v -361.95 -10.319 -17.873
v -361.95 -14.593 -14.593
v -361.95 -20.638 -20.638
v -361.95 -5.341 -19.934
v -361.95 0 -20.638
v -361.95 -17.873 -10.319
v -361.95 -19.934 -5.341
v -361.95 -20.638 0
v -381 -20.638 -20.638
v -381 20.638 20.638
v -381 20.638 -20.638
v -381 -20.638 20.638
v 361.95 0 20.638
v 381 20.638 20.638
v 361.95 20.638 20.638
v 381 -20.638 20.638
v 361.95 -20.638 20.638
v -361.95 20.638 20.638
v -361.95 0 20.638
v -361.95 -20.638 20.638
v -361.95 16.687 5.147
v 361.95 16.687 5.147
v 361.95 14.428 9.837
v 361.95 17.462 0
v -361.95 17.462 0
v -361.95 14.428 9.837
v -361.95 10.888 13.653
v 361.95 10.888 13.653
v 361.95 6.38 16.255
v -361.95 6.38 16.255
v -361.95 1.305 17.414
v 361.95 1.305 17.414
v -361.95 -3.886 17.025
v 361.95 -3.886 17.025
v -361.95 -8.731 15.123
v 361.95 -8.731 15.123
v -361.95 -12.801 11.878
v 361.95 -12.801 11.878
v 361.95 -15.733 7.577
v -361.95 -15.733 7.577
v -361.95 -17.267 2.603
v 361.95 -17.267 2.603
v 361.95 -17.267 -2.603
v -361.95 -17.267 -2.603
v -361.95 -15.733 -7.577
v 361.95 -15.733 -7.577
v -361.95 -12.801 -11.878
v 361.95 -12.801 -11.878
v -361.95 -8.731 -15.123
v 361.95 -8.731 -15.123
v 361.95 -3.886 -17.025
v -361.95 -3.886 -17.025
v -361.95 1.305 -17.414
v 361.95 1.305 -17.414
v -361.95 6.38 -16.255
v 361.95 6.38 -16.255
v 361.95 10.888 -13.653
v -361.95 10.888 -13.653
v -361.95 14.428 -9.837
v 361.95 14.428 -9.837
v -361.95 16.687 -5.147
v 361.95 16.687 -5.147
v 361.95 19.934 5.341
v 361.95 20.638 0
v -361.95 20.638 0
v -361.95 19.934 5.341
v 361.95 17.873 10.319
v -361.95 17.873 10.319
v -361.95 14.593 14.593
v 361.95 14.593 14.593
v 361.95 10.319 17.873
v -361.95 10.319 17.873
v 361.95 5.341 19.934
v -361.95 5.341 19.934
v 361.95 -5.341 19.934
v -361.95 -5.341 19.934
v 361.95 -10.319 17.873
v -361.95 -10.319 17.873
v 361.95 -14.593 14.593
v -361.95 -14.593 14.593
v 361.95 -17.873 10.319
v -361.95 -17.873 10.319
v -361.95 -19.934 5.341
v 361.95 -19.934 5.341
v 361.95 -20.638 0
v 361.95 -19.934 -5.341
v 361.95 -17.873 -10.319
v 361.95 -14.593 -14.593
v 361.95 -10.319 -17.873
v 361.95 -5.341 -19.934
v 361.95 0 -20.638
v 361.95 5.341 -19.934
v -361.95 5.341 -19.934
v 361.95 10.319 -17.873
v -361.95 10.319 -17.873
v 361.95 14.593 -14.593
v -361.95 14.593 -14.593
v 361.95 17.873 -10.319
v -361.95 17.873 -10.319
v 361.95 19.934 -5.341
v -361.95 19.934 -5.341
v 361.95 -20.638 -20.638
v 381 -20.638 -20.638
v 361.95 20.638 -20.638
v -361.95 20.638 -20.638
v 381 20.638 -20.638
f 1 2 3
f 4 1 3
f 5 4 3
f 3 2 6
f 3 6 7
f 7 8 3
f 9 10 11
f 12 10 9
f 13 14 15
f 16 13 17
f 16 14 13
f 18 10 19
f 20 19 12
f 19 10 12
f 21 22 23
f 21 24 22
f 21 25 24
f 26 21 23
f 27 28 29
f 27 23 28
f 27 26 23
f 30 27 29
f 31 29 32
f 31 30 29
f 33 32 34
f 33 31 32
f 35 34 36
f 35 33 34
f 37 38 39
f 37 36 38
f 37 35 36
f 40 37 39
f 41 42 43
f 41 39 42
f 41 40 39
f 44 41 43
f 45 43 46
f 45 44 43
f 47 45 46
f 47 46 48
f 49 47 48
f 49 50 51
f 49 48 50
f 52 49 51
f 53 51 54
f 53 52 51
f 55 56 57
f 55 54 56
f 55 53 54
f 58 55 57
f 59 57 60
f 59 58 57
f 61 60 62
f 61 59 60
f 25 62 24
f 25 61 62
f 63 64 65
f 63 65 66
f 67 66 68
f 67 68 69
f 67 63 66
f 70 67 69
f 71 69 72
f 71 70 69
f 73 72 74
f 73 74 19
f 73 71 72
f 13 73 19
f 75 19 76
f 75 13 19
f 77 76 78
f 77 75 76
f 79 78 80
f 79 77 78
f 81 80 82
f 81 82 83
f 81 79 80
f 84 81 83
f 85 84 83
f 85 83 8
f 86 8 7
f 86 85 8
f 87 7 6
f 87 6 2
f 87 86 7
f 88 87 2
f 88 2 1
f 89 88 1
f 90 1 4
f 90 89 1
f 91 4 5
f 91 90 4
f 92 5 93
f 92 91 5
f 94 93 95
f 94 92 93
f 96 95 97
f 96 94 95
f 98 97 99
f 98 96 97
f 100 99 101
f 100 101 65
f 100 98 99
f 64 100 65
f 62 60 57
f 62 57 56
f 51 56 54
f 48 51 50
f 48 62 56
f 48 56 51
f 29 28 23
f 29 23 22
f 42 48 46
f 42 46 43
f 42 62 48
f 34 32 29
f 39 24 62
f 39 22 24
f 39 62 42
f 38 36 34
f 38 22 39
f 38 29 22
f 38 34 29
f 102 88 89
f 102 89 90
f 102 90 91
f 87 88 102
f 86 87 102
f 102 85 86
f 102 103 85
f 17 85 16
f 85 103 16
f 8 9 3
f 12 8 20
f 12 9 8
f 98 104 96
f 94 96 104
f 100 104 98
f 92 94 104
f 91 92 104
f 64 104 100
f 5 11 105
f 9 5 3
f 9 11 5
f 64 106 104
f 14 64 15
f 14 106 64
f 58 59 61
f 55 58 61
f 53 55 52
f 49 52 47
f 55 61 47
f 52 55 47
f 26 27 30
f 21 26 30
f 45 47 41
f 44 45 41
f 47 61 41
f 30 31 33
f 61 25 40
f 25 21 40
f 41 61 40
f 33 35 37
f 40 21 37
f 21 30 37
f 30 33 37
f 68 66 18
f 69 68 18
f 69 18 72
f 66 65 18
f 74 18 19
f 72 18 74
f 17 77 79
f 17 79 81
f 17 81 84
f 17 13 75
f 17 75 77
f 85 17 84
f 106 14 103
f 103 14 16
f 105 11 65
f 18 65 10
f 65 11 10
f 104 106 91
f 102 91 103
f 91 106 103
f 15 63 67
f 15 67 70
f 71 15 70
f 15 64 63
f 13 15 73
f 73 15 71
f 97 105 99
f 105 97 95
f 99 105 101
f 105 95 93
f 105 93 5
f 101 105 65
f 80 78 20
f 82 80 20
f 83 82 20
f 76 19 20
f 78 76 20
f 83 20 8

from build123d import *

# Parameters (mm, degrees)
F0_R     = 20.6375
F0_R_2   = 17.4625
F1_DEPTH = 381
F2_W     = 41.275
F2_H     = 41.275
F3_DEPTH = 19.05


# Not quite as in the source:
# - a pattern or mirror of a feature is missing from the dataset's text; its kind, count and spacing are read off the source's solid


with BuildPart() as f1:
    # F0 (on Right) → F1 (new body, symmetric)
    with BuildSketch(Plane.YZ):
        Circle(F0_R)
        Circle(F0_R_2, mode=Mode.SUBTRACT)
    extrude(amount=F1_DEPTH, both=True)

    # F2 (on face) → F3 (join)
    with BuildSketch(Plane(origin=(-381, 0, 0), x_dir=(0, -1, 0), z_dir=(-1, 0, 0))):
        Rectangle(F2_W, F2_H)
    f3 = extrude(amount=-F3_DEPTH)

    # F3_copies: F3 across plane
    add(f3.mirror(Plane(origin=(0, 0, 0), x_dir=(0, 0, 1), z_dir=(1, 0, 0))))


solid = f1.part
